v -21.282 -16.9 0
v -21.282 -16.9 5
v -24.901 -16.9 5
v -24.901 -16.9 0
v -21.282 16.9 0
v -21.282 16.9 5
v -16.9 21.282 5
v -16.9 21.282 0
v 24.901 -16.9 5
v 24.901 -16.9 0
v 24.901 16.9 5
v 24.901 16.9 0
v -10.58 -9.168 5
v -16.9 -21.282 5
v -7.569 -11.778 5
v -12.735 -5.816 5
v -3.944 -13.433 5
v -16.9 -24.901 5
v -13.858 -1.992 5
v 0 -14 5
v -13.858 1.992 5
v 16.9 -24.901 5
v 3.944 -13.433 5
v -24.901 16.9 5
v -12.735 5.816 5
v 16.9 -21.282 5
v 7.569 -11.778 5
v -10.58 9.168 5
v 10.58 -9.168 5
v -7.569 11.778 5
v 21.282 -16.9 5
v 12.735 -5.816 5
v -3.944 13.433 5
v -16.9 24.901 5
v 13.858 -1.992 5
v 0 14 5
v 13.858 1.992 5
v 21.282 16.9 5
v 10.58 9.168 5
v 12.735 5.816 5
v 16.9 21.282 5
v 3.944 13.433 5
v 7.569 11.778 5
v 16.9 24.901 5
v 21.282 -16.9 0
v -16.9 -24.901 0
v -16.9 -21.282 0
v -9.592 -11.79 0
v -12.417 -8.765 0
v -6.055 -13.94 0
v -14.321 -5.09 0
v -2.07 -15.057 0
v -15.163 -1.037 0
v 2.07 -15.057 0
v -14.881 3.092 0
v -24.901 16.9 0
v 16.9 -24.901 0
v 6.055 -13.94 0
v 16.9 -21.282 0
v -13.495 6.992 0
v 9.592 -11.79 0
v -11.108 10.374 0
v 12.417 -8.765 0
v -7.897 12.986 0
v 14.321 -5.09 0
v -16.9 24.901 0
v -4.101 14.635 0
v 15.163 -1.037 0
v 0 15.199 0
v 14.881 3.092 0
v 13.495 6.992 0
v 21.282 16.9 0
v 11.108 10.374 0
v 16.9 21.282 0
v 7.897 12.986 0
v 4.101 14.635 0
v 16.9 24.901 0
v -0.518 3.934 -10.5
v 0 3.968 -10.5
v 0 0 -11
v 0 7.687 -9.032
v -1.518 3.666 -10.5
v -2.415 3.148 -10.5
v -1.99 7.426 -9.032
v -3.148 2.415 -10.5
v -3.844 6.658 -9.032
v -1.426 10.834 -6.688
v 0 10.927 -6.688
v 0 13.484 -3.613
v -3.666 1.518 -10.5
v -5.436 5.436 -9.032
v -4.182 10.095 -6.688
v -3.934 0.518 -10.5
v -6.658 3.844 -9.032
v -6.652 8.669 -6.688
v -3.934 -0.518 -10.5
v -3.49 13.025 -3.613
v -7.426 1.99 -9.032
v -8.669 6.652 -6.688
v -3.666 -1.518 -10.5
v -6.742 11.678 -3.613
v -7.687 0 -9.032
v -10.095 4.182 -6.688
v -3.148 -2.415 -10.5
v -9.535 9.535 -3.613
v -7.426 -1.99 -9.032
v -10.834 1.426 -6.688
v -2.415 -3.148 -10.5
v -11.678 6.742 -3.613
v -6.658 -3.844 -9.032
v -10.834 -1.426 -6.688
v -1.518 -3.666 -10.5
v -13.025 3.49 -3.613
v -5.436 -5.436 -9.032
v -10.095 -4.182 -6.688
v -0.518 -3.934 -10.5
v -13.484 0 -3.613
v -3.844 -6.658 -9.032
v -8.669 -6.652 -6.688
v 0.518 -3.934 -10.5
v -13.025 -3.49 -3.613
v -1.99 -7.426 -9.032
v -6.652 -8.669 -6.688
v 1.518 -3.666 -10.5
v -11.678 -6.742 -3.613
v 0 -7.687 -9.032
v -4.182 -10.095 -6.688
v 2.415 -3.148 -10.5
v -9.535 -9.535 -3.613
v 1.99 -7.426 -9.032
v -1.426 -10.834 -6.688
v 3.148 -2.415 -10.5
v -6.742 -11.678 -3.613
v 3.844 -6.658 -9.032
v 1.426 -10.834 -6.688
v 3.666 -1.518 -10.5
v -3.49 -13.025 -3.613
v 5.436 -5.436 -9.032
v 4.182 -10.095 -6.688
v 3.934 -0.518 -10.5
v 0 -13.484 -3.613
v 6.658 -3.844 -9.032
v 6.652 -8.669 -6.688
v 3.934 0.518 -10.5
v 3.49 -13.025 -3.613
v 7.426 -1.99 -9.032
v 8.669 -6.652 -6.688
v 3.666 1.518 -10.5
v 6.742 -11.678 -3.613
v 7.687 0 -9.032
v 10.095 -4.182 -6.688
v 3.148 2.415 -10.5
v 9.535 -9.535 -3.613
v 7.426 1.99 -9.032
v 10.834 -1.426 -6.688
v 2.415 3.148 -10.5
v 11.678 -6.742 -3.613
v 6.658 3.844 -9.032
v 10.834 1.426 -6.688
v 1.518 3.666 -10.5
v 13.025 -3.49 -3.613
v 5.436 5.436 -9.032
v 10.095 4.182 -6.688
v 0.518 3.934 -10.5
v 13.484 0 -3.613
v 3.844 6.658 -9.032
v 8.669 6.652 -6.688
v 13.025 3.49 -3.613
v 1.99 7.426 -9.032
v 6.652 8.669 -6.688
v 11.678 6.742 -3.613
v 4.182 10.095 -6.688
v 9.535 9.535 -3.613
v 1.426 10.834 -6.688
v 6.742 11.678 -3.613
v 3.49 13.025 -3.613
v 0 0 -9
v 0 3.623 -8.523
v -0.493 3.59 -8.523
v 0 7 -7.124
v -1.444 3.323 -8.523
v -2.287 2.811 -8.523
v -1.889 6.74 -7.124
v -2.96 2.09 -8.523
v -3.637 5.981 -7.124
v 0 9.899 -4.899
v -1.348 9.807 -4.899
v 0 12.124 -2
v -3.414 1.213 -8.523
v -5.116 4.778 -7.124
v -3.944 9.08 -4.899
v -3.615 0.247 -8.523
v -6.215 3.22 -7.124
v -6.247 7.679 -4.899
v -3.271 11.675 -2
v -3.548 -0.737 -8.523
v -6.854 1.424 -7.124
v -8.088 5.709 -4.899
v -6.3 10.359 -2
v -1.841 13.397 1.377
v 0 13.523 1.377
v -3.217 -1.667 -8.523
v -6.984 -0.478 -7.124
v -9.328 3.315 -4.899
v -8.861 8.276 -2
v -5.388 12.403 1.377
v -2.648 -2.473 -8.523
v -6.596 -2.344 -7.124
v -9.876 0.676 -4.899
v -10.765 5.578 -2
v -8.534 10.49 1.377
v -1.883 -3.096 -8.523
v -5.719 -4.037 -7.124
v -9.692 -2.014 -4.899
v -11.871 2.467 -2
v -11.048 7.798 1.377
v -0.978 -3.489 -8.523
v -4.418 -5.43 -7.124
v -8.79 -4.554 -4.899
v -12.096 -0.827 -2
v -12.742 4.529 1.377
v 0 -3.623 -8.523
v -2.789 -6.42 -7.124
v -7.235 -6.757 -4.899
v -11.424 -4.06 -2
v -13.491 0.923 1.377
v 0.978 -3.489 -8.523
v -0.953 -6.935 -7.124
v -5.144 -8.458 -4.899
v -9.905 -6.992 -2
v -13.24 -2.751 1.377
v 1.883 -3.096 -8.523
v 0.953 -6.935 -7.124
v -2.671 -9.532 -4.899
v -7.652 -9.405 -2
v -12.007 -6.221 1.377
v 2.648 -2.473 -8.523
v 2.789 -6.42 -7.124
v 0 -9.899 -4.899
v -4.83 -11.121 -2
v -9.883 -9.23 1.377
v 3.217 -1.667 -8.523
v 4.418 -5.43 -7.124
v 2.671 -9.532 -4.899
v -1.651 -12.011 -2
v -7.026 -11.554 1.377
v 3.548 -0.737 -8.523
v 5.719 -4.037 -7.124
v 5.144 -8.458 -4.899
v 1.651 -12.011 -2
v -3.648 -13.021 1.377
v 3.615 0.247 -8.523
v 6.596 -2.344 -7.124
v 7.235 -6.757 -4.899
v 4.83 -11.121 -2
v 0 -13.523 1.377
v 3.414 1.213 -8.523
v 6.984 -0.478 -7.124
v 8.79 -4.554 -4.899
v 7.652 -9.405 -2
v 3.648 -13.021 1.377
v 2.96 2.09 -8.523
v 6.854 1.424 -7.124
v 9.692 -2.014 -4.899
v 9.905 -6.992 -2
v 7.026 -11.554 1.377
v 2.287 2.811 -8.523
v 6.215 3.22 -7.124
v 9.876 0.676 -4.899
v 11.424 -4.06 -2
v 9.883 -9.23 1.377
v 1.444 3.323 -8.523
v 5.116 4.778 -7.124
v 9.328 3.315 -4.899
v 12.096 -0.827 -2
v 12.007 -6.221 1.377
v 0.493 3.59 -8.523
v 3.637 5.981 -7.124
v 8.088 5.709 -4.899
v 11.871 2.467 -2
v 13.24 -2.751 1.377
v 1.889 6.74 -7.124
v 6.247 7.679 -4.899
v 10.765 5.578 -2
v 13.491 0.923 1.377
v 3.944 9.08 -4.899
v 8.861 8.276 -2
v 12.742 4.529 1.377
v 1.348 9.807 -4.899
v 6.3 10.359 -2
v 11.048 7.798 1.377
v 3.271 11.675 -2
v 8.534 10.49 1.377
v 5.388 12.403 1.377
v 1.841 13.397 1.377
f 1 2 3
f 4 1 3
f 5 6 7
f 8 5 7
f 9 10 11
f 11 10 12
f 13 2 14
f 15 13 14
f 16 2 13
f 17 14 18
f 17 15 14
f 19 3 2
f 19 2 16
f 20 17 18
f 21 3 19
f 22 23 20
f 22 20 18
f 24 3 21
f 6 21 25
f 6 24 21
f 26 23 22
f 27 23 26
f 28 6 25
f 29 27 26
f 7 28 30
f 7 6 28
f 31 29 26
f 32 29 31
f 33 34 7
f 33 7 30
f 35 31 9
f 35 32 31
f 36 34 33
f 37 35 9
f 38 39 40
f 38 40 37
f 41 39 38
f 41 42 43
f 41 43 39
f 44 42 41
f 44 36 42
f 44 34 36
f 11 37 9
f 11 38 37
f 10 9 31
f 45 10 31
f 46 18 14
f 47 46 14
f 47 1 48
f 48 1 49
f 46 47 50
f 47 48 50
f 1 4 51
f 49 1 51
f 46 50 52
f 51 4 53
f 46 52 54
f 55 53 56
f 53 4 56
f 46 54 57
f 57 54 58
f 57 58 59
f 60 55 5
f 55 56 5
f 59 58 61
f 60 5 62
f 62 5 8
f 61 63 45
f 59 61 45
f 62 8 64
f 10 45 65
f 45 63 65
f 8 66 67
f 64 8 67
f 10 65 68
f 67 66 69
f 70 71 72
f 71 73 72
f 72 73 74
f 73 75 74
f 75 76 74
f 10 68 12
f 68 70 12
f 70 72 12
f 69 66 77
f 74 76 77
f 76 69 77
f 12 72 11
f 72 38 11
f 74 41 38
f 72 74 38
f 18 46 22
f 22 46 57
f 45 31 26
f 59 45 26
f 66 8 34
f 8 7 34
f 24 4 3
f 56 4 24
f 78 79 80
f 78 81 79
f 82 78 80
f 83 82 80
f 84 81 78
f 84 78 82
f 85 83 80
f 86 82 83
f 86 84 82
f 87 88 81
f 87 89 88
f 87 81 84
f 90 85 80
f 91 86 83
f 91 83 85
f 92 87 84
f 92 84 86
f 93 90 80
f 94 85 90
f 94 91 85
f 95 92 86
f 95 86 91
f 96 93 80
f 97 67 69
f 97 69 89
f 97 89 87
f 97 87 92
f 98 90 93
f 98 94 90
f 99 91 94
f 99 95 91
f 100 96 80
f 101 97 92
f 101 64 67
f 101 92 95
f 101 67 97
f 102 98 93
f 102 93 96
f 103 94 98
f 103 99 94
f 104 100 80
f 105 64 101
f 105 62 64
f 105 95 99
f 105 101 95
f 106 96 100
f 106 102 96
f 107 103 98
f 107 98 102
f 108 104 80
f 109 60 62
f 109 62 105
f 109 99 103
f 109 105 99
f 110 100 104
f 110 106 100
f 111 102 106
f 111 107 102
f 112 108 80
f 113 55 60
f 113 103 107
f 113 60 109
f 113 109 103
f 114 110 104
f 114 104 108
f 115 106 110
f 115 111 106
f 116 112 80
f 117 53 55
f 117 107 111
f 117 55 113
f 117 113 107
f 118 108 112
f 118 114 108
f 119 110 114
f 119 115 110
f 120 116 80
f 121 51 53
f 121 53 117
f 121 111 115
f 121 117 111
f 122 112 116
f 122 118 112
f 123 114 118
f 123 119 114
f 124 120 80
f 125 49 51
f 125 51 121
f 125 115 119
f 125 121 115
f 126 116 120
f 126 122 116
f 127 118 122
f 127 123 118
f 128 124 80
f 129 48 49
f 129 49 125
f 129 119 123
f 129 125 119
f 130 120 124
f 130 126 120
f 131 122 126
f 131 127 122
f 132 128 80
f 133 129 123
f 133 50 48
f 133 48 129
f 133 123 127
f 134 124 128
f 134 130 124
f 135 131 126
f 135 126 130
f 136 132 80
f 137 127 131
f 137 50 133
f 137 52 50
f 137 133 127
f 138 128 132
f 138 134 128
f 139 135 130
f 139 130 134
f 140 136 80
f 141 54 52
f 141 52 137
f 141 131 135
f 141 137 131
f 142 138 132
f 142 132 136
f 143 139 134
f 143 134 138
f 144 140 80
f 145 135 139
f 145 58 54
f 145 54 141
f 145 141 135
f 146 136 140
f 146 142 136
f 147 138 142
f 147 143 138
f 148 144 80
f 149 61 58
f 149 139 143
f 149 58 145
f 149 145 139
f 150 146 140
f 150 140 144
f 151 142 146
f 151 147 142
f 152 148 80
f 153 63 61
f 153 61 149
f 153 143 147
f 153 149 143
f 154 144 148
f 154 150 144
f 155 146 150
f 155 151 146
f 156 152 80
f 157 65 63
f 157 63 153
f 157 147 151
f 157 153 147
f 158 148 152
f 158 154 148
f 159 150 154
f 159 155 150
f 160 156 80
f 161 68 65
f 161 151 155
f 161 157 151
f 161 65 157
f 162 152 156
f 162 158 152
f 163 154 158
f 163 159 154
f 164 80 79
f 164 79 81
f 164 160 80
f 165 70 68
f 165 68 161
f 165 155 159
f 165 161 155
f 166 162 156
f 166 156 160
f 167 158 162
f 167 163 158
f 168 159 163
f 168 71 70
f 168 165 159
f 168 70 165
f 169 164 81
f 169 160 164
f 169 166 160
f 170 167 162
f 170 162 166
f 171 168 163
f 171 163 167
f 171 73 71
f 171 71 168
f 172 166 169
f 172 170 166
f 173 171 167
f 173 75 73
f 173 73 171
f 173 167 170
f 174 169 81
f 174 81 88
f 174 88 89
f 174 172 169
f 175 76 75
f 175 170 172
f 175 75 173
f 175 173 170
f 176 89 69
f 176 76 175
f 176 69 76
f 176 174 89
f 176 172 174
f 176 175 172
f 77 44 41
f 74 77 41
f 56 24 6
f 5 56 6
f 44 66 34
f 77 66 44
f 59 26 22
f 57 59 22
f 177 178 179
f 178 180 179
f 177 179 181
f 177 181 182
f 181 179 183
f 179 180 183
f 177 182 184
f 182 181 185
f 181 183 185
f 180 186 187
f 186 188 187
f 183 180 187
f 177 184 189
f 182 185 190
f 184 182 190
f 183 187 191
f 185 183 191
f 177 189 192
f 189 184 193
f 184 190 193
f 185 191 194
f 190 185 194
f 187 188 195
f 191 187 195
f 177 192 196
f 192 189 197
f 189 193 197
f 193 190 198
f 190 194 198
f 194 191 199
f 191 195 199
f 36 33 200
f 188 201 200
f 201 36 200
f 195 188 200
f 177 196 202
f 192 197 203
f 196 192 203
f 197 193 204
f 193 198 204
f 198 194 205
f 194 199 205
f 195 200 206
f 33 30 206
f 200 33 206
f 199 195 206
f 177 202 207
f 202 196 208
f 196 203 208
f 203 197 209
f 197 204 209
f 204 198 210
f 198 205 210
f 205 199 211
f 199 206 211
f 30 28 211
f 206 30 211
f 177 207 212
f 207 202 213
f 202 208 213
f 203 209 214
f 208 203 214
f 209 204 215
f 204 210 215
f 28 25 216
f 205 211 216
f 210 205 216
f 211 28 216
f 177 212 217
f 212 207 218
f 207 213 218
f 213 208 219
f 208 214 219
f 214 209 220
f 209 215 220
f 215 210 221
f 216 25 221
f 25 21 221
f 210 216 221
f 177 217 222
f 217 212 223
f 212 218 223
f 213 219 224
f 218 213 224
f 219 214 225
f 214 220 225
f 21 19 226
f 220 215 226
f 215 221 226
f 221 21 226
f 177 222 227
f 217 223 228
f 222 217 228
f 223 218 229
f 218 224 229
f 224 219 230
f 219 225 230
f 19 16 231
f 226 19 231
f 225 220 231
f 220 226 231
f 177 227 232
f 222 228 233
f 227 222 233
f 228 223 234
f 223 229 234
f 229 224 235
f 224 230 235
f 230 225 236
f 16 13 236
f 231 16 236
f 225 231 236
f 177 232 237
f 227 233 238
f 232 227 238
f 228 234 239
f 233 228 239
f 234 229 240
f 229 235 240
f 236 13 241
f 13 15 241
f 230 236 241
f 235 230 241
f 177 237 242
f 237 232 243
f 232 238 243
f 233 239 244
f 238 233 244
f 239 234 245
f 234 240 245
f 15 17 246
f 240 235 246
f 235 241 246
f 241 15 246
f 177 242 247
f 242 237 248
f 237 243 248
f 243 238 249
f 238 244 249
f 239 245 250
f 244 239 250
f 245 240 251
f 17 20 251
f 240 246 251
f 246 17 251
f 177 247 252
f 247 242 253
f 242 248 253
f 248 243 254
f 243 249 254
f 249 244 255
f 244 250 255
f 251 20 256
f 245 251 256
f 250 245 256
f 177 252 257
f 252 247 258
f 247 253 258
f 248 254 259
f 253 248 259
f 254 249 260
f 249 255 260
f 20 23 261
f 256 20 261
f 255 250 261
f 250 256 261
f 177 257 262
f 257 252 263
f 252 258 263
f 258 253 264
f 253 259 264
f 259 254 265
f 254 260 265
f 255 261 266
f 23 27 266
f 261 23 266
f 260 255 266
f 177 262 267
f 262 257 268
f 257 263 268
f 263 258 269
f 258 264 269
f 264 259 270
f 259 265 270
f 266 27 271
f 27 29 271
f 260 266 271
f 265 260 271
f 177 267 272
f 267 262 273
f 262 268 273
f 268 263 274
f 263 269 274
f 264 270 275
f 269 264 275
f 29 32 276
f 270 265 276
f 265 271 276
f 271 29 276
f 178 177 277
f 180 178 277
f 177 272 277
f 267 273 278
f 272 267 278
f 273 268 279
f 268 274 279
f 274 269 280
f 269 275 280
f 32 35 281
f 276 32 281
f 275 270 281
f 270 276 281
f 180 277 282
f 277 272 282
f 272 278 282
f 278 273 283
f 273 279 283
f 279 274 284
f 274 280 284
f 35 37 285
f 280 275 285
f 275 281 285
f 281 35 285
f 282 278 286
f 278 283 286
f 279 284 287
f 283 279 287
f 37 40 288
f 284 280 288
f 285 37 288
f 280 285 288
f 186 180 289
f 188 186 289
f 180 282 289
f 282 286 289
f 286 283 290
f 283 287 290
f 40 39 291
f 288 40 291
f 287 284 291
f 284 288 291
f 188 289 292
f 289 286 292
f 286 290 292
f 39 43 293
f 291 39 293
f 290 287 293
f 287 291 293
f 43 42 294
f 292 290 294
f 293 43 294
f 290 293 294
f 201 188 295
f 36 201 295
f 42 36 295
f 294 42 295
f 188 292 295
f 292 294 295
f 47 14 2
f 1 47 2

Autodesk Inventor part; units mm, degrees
ref_plane "YZ Plane" through (0, 0, 0) normal (1, 0, 0) x (0, 1, 0)
ref_plane "XZ Plane" through (0, 0, 0) normal (0, 1, 0) x (-1, 0, 0)
ref_plane "XY Plane" through (0, 0, 0) normal (0, 0, 1) x (1, 0, 0)
sketch "Sketch1" plane through (0, 0, 0) normal (0, 0, 1) x (1, 0, 0)
  line L0 (-38.8739, 0) -> (58.9391, 0) construction
  line L1 (0, -36.2399) -> (0, 43.1348) construction
  line L2 (0, 0) -> (31.7956, 31.7956) construction
  line L3 (0, 0) -> (44.9658, 0) construction
  line L4 (0, 24.9006) -> (16.8, 24.9006)
  line L5 (16.8, 24.9006) -> (16.8, 21.2406)
  line L6 (16.8, 21.2406) -> (19.0203, 19.0203)
  line L7 (24.9006, 0) -> (24.9006, 16.8)
  line L8 (24.9006, 16.8) -> (21.2406, 16.8)
  line L9 (21.2406, 16.8) -> (19.0203, 19.0203)
  line L10 (0, 24.9006) -> (-16.8, 24.9006)
  line L11 (-16.8, 24.9006) -> (-16.8, 21.2406)
  line L12 (-16.8, 21.2406) -> (-19.0203, 19.0203)
  line L13 (-24.9006, 0) -> (-24.9006, 16.8)
  line L14 (-24.9006, 16.8) -> (-21.2406, 16.8)
  line L15 (-21.2406, 16.8) -> (-19.0203, 19.0203)
  line L16 (0, -24.9006) -> (16.8, -24.9006)
  line L17 (16.8, -24.9006) -> (16.8, -21.2406)
  line L18 (16.8, -21.2406) -> (19.0203, -19.0203)
  line L19 (24.9006, 0) -> (24.9006, -16.8)
  line L20 (24.9006, -16.8) -> (21.2406, -16.8)
  line L21 (21.2406, -16.8) -> (19.0203, -19.0203)
  line L22 (0, -24.9006) -> (-16.8, -24.9006)
  line L23 (-16.8, -24.9006) -> (-16.8, -21.2406)
  line L24 (-16.8, -21.2406) -> (-19.0203, -19.0203)
  line L25 (-24.9006, 0) -> (-24.9006, -16.8)
  line L26 (-24.9006, -16.8) -> (-21.2406, -16.8)
  line L27 (-21.2406, -16.8) -> (-19.0203, -19.0203)
  circle A0 centre (0, 0) radius 14
  dimension "d0" = 45
  dimension "d1" = 16.8
  dimension "d2" = 3.66
  dimension "d3" = 3.14
  dimension "d4" = 28
extrude "Extrusion1" add sketch "Sketch1" along normal blind 5
sketch "Sketch2" plane through (0, 0, 5) normal (0, 0, 1) x (1, 0, 0)
  circle A0 centre (0, 0) radius 14 construction
  line L0 (16.8, 24.9006) -> (-16.8, 24.9006) construction
  line L1 (-16.8, 24.9006) -> (-16.8, 21.2406) construction
  line L2 (-16.8, 21.2406) -> (-21.2406, 16.8) construction
  line L3 (-21.2406, 16.8) -> (-24.9006, 16.8) construction
  line L4 (-24.9006, 16.8) -> (-24.9006, -16.8) construction
  line L5 (-24.9006, -16.8) -> (-21.2406, -16.8) construction
  line L6 (-21.2406, -16.8) -> (-16.8, -21.2406) construction
  line L7 (-16.8, -21.2406) -> (-16.8, -24.9006) construction
  line L8 (-16.8, -24.9006) -> (16.8, -24.9006) construction
  line L9 (16.8, -24.9006) -> (16.8, -21.2406) construction
  line L10 (16.8, -21.2406) -> (21.2406, -16.8) construction
  line L11 (21.2406, -16.8) -> (24.9006, -16.8) construction
  line L12 (24.9006, -16.8) -> (24.9006, 16.8) construction
  line L13 (24.9006, 16.8) -> (21.2406, 16.8) construction
  line L14 (21.2406, 16.8) -> (16.8, 21.2406) construction
  line L15 (16.8, 21.2406) -> (16.8, 24.9006) construction
  line L16 (-34.8609, 0) -> (34.8609, 0) construction
  line L17 (0, -34.8609) -> (0, 34.8609) construction
  circle A1 centre (13, -13) radius 2.5
  circle A2 centre (-13, -13) radius 2.5
  dimension "d7" = 5
  dimension "d8" = 13
  dimension "d9" = 13
extrude "Extrusion2" [suppressed]
sketch "Sketch3" plane through (0, 0, 0) normal (1, 0, 0) x (0, 1, 0)
  line L0 (-14, 5) -> (14, 5) construction
  line L1 (24.9006, 5) -> (21.2406, 5) construction
  line L2 (21.2406, 5) -> (16.8, 5) construction
  line L3 (16.8, 5) -> (-16.8, 5) construction
  line L4 (-16.8, 5) -> (-21.2406, 5) construction
  line L5 (-21.2406, 5) -> (-24.9006, 5) construction
  line L6 (-24.9006, 5) -> (-21.2406, 5) construction
  line L7 (-21.2406, 5) -> (-16.8, 5) construction
  line L8 (-16.8, 5) -> (16.8, 5) construction
  line L9 (16.8, 5) -> (21.2406, 5) construction
  line L10 (21.2406, 5) -> (24.9006, 5) construction
  line L11 (24.9006, 0) -> (21.2406, 0) construction
  line L12 (24.9006, 0) -> (24.9006, 5) construction
  line L13 (21.2406, 5) -> (24.9006, 5) construction
  line L14 (21.2406, 0) -> (21.2406, 5) construction
  line L15 (21.2406, 0) -> (16.8, 0) construction
  line L16 (21.2406, 0) -> (21.2406, 5) construction
  line L17 (16.8, 5) -> (21.2406, 5) construction
  line L18 (16.8, 0) -> (16.8, 5) construction
  line L19 (16.8, 0) -> (-16.8, 0) construction
  line L20 (16.8, 0) -> (16.8, 5) construction
  line L21 (-16.8, 5) -> (16.8, 5) construction
  line L22 (-16.8, 0) -> (-16.8, 5) construction
  line L23 (-16.8, 0) -> (-21.2406, 0) construction
  line L24 (-16.8, 0) -> (-16.8, 5) construction
  line L25 (-21.2406, 5) -> (-16.8, 5) construction
  line L26 (-21.2406, 0) -> (-21.2406, 5) construction
  line L27 (-21.2406, 0) -> (-24.9006, 0) construction
  line L28 (-21.2406, 0) -> (-21.2406, 5) construction
  line L29 (-24.9006, 5) -> (-21.2406, 5) construction
  line L30 (-24.9006, 0) -> (-24.9006, 5) construction
  line L31 (-14, 5) -> (14, 5) construction
  line L32 (14, 0) -> (-14, 0) construction
  line L33 (16.8, 5) -> (-16.8, 5)
  arc A0 (0, -9) -> (14, 5) centre (0, 5) ccw
  line L34 (0, -16.0037) -> (0, 8.5006) construction
  arc A1 (0, -11) -> (16, 5) centre (0, 5) ccw
  line L35 (0, -9) -> (0, -11)
  line L36 (16, 5) -> (14, 5)
revolve "Revolution1" add sketch "Sketch3" angle 360 about axis through (0, 0, -10) along (0, 0, 1)
sketch "Skizze4" plane through (0, 0, 5) normal (0, 0, 1) x (1, 0, 0)
  circle A0 centre (0, 0) radius 14 construction
  line L0 (16.8, 24.9006) -> (-16.8, 24.9006) construction
  line L1 (-16.8, 24.9006) -> (-16.8, 21.2406) projected
  line L2 (-16.8, 21.2406) -> (-21.2406, 16.8) projected
  line L3 (-21.2406, 16.8) -> (-24.9006, 16.8) projected
  line L4 (-24.9006, 16.8) -> (-24.9006, -16.8) construction
  line L5 (-24.9006, -16.8) -> (-21.2406, -16.8) projected
  line L6 (-21.2406, -16.8) -> (-16.8, -21.2406) projected
  line L7 (-16.8, -21.2406) -> (-16.8, -24.9006) projected
  line L8 (-16.8, -24.9006) -> (16.8, -24.9006) construction
  line L9 (16.8, -24.9006) -> (16.8, -21.2406) projected
  line L10 (16.8, -21.2406) -> (21.2406, -16.8) projected
  line L11 (21.2406, -16.8) -> (24.9006, -16.8) projected
  line L12 (24.9006, -16.8) -> (24.9006, 16.8) construction
  line L13 (24.9006, 16.8) -> (21.2406, 16.8) projected
  line L14 (21.2406, 16.8) -> (16.8, 21.2406) projected
  line L15 (16.8, 21.2406) -> (16.8, 24.9006) projected
  line L16 (-16.9, 25.0006) -> (16.9, 25.0006) construction
  line L17 (16.9, 25.0006) -> (16.9, 21.2821)
  line L18 (16.9, 21.2821) -> (21.2821, 16.9)
  line L19 (21.2821, 16.9) -> (25.0006, 16.9)
  line L20 (25.0006, 16.9) -> (25.0006, -16.9) construction
  line L21 (25.0006, -16.9) -> (21.2821, -16.9)
  line L22 (21.2821, -16.9) -> (16.9, -21.2821)
  line L23 (16.9, -21.2821) -> (16.9, -25.0006)
  line L24 (16.9, -25.0006) -> (-16.9, -25.0006) construction
  line L25 (-16.9, -25.0006) -> (-16.9, -21.2821)
  line L26 (-16.9, -21.2821) -> (-21.2821, -16.9)
  line L27 (-21.2821, -16.9) -> (-25.0006, -16.9)
  line L28 (-25.0006, -16.9) -> (-25.0006, 16.9) construction
  line L29 (-25.0006, 16.9) -> (-21.2821, 16.9)
  line L30 (-21.2821, 16.9) -> (-16.9, 21.2821)
  line L31 (-16.9, 21.2821) -> (-16.9, 25.0006)
  line L32 (-24.9006, 16.8) -> (-24.9006, 16.9)
  line L33 (16.8, 24.9006) -> (-16.8, 24.9006) projected
  line L34 (-16.8, 24.9006) -> (-16.9, 24.9006)
  line L35 (16.8, 24.9006) -> (16.9, 24.9006)
  line L36 (24.9006, -16.8) -> (24.9006, 16.8) projected
  line L37 (24.9006, 16.8) -> (24.9006, 16.9)
  line L38 (24.9006, -16.8) -> (24.9006, -16.9)
  line L39 (16.8, -24.9006) -> (16.8, -21.2406) projected
  line L40 (16.8, -24.9006) -> (16.9, -24.9006)
  line L41 (-16.8, -24.9006) -> (-16.9, -24.9006)
  line L42 (-24.9006, -16.8) -> (-24.9006, 16.8) projected
  line L43 (-24.9006, -16.8) -> (-24.9006, -16.9)
  dimension "d15" = 0.1
extrude "IM_offset" add sketch "Skizze4" against normal up to surface (5 mm away)
equation "\"d9\" = d8"
properties part number "20_Cube_Insert_Eye_v3"
